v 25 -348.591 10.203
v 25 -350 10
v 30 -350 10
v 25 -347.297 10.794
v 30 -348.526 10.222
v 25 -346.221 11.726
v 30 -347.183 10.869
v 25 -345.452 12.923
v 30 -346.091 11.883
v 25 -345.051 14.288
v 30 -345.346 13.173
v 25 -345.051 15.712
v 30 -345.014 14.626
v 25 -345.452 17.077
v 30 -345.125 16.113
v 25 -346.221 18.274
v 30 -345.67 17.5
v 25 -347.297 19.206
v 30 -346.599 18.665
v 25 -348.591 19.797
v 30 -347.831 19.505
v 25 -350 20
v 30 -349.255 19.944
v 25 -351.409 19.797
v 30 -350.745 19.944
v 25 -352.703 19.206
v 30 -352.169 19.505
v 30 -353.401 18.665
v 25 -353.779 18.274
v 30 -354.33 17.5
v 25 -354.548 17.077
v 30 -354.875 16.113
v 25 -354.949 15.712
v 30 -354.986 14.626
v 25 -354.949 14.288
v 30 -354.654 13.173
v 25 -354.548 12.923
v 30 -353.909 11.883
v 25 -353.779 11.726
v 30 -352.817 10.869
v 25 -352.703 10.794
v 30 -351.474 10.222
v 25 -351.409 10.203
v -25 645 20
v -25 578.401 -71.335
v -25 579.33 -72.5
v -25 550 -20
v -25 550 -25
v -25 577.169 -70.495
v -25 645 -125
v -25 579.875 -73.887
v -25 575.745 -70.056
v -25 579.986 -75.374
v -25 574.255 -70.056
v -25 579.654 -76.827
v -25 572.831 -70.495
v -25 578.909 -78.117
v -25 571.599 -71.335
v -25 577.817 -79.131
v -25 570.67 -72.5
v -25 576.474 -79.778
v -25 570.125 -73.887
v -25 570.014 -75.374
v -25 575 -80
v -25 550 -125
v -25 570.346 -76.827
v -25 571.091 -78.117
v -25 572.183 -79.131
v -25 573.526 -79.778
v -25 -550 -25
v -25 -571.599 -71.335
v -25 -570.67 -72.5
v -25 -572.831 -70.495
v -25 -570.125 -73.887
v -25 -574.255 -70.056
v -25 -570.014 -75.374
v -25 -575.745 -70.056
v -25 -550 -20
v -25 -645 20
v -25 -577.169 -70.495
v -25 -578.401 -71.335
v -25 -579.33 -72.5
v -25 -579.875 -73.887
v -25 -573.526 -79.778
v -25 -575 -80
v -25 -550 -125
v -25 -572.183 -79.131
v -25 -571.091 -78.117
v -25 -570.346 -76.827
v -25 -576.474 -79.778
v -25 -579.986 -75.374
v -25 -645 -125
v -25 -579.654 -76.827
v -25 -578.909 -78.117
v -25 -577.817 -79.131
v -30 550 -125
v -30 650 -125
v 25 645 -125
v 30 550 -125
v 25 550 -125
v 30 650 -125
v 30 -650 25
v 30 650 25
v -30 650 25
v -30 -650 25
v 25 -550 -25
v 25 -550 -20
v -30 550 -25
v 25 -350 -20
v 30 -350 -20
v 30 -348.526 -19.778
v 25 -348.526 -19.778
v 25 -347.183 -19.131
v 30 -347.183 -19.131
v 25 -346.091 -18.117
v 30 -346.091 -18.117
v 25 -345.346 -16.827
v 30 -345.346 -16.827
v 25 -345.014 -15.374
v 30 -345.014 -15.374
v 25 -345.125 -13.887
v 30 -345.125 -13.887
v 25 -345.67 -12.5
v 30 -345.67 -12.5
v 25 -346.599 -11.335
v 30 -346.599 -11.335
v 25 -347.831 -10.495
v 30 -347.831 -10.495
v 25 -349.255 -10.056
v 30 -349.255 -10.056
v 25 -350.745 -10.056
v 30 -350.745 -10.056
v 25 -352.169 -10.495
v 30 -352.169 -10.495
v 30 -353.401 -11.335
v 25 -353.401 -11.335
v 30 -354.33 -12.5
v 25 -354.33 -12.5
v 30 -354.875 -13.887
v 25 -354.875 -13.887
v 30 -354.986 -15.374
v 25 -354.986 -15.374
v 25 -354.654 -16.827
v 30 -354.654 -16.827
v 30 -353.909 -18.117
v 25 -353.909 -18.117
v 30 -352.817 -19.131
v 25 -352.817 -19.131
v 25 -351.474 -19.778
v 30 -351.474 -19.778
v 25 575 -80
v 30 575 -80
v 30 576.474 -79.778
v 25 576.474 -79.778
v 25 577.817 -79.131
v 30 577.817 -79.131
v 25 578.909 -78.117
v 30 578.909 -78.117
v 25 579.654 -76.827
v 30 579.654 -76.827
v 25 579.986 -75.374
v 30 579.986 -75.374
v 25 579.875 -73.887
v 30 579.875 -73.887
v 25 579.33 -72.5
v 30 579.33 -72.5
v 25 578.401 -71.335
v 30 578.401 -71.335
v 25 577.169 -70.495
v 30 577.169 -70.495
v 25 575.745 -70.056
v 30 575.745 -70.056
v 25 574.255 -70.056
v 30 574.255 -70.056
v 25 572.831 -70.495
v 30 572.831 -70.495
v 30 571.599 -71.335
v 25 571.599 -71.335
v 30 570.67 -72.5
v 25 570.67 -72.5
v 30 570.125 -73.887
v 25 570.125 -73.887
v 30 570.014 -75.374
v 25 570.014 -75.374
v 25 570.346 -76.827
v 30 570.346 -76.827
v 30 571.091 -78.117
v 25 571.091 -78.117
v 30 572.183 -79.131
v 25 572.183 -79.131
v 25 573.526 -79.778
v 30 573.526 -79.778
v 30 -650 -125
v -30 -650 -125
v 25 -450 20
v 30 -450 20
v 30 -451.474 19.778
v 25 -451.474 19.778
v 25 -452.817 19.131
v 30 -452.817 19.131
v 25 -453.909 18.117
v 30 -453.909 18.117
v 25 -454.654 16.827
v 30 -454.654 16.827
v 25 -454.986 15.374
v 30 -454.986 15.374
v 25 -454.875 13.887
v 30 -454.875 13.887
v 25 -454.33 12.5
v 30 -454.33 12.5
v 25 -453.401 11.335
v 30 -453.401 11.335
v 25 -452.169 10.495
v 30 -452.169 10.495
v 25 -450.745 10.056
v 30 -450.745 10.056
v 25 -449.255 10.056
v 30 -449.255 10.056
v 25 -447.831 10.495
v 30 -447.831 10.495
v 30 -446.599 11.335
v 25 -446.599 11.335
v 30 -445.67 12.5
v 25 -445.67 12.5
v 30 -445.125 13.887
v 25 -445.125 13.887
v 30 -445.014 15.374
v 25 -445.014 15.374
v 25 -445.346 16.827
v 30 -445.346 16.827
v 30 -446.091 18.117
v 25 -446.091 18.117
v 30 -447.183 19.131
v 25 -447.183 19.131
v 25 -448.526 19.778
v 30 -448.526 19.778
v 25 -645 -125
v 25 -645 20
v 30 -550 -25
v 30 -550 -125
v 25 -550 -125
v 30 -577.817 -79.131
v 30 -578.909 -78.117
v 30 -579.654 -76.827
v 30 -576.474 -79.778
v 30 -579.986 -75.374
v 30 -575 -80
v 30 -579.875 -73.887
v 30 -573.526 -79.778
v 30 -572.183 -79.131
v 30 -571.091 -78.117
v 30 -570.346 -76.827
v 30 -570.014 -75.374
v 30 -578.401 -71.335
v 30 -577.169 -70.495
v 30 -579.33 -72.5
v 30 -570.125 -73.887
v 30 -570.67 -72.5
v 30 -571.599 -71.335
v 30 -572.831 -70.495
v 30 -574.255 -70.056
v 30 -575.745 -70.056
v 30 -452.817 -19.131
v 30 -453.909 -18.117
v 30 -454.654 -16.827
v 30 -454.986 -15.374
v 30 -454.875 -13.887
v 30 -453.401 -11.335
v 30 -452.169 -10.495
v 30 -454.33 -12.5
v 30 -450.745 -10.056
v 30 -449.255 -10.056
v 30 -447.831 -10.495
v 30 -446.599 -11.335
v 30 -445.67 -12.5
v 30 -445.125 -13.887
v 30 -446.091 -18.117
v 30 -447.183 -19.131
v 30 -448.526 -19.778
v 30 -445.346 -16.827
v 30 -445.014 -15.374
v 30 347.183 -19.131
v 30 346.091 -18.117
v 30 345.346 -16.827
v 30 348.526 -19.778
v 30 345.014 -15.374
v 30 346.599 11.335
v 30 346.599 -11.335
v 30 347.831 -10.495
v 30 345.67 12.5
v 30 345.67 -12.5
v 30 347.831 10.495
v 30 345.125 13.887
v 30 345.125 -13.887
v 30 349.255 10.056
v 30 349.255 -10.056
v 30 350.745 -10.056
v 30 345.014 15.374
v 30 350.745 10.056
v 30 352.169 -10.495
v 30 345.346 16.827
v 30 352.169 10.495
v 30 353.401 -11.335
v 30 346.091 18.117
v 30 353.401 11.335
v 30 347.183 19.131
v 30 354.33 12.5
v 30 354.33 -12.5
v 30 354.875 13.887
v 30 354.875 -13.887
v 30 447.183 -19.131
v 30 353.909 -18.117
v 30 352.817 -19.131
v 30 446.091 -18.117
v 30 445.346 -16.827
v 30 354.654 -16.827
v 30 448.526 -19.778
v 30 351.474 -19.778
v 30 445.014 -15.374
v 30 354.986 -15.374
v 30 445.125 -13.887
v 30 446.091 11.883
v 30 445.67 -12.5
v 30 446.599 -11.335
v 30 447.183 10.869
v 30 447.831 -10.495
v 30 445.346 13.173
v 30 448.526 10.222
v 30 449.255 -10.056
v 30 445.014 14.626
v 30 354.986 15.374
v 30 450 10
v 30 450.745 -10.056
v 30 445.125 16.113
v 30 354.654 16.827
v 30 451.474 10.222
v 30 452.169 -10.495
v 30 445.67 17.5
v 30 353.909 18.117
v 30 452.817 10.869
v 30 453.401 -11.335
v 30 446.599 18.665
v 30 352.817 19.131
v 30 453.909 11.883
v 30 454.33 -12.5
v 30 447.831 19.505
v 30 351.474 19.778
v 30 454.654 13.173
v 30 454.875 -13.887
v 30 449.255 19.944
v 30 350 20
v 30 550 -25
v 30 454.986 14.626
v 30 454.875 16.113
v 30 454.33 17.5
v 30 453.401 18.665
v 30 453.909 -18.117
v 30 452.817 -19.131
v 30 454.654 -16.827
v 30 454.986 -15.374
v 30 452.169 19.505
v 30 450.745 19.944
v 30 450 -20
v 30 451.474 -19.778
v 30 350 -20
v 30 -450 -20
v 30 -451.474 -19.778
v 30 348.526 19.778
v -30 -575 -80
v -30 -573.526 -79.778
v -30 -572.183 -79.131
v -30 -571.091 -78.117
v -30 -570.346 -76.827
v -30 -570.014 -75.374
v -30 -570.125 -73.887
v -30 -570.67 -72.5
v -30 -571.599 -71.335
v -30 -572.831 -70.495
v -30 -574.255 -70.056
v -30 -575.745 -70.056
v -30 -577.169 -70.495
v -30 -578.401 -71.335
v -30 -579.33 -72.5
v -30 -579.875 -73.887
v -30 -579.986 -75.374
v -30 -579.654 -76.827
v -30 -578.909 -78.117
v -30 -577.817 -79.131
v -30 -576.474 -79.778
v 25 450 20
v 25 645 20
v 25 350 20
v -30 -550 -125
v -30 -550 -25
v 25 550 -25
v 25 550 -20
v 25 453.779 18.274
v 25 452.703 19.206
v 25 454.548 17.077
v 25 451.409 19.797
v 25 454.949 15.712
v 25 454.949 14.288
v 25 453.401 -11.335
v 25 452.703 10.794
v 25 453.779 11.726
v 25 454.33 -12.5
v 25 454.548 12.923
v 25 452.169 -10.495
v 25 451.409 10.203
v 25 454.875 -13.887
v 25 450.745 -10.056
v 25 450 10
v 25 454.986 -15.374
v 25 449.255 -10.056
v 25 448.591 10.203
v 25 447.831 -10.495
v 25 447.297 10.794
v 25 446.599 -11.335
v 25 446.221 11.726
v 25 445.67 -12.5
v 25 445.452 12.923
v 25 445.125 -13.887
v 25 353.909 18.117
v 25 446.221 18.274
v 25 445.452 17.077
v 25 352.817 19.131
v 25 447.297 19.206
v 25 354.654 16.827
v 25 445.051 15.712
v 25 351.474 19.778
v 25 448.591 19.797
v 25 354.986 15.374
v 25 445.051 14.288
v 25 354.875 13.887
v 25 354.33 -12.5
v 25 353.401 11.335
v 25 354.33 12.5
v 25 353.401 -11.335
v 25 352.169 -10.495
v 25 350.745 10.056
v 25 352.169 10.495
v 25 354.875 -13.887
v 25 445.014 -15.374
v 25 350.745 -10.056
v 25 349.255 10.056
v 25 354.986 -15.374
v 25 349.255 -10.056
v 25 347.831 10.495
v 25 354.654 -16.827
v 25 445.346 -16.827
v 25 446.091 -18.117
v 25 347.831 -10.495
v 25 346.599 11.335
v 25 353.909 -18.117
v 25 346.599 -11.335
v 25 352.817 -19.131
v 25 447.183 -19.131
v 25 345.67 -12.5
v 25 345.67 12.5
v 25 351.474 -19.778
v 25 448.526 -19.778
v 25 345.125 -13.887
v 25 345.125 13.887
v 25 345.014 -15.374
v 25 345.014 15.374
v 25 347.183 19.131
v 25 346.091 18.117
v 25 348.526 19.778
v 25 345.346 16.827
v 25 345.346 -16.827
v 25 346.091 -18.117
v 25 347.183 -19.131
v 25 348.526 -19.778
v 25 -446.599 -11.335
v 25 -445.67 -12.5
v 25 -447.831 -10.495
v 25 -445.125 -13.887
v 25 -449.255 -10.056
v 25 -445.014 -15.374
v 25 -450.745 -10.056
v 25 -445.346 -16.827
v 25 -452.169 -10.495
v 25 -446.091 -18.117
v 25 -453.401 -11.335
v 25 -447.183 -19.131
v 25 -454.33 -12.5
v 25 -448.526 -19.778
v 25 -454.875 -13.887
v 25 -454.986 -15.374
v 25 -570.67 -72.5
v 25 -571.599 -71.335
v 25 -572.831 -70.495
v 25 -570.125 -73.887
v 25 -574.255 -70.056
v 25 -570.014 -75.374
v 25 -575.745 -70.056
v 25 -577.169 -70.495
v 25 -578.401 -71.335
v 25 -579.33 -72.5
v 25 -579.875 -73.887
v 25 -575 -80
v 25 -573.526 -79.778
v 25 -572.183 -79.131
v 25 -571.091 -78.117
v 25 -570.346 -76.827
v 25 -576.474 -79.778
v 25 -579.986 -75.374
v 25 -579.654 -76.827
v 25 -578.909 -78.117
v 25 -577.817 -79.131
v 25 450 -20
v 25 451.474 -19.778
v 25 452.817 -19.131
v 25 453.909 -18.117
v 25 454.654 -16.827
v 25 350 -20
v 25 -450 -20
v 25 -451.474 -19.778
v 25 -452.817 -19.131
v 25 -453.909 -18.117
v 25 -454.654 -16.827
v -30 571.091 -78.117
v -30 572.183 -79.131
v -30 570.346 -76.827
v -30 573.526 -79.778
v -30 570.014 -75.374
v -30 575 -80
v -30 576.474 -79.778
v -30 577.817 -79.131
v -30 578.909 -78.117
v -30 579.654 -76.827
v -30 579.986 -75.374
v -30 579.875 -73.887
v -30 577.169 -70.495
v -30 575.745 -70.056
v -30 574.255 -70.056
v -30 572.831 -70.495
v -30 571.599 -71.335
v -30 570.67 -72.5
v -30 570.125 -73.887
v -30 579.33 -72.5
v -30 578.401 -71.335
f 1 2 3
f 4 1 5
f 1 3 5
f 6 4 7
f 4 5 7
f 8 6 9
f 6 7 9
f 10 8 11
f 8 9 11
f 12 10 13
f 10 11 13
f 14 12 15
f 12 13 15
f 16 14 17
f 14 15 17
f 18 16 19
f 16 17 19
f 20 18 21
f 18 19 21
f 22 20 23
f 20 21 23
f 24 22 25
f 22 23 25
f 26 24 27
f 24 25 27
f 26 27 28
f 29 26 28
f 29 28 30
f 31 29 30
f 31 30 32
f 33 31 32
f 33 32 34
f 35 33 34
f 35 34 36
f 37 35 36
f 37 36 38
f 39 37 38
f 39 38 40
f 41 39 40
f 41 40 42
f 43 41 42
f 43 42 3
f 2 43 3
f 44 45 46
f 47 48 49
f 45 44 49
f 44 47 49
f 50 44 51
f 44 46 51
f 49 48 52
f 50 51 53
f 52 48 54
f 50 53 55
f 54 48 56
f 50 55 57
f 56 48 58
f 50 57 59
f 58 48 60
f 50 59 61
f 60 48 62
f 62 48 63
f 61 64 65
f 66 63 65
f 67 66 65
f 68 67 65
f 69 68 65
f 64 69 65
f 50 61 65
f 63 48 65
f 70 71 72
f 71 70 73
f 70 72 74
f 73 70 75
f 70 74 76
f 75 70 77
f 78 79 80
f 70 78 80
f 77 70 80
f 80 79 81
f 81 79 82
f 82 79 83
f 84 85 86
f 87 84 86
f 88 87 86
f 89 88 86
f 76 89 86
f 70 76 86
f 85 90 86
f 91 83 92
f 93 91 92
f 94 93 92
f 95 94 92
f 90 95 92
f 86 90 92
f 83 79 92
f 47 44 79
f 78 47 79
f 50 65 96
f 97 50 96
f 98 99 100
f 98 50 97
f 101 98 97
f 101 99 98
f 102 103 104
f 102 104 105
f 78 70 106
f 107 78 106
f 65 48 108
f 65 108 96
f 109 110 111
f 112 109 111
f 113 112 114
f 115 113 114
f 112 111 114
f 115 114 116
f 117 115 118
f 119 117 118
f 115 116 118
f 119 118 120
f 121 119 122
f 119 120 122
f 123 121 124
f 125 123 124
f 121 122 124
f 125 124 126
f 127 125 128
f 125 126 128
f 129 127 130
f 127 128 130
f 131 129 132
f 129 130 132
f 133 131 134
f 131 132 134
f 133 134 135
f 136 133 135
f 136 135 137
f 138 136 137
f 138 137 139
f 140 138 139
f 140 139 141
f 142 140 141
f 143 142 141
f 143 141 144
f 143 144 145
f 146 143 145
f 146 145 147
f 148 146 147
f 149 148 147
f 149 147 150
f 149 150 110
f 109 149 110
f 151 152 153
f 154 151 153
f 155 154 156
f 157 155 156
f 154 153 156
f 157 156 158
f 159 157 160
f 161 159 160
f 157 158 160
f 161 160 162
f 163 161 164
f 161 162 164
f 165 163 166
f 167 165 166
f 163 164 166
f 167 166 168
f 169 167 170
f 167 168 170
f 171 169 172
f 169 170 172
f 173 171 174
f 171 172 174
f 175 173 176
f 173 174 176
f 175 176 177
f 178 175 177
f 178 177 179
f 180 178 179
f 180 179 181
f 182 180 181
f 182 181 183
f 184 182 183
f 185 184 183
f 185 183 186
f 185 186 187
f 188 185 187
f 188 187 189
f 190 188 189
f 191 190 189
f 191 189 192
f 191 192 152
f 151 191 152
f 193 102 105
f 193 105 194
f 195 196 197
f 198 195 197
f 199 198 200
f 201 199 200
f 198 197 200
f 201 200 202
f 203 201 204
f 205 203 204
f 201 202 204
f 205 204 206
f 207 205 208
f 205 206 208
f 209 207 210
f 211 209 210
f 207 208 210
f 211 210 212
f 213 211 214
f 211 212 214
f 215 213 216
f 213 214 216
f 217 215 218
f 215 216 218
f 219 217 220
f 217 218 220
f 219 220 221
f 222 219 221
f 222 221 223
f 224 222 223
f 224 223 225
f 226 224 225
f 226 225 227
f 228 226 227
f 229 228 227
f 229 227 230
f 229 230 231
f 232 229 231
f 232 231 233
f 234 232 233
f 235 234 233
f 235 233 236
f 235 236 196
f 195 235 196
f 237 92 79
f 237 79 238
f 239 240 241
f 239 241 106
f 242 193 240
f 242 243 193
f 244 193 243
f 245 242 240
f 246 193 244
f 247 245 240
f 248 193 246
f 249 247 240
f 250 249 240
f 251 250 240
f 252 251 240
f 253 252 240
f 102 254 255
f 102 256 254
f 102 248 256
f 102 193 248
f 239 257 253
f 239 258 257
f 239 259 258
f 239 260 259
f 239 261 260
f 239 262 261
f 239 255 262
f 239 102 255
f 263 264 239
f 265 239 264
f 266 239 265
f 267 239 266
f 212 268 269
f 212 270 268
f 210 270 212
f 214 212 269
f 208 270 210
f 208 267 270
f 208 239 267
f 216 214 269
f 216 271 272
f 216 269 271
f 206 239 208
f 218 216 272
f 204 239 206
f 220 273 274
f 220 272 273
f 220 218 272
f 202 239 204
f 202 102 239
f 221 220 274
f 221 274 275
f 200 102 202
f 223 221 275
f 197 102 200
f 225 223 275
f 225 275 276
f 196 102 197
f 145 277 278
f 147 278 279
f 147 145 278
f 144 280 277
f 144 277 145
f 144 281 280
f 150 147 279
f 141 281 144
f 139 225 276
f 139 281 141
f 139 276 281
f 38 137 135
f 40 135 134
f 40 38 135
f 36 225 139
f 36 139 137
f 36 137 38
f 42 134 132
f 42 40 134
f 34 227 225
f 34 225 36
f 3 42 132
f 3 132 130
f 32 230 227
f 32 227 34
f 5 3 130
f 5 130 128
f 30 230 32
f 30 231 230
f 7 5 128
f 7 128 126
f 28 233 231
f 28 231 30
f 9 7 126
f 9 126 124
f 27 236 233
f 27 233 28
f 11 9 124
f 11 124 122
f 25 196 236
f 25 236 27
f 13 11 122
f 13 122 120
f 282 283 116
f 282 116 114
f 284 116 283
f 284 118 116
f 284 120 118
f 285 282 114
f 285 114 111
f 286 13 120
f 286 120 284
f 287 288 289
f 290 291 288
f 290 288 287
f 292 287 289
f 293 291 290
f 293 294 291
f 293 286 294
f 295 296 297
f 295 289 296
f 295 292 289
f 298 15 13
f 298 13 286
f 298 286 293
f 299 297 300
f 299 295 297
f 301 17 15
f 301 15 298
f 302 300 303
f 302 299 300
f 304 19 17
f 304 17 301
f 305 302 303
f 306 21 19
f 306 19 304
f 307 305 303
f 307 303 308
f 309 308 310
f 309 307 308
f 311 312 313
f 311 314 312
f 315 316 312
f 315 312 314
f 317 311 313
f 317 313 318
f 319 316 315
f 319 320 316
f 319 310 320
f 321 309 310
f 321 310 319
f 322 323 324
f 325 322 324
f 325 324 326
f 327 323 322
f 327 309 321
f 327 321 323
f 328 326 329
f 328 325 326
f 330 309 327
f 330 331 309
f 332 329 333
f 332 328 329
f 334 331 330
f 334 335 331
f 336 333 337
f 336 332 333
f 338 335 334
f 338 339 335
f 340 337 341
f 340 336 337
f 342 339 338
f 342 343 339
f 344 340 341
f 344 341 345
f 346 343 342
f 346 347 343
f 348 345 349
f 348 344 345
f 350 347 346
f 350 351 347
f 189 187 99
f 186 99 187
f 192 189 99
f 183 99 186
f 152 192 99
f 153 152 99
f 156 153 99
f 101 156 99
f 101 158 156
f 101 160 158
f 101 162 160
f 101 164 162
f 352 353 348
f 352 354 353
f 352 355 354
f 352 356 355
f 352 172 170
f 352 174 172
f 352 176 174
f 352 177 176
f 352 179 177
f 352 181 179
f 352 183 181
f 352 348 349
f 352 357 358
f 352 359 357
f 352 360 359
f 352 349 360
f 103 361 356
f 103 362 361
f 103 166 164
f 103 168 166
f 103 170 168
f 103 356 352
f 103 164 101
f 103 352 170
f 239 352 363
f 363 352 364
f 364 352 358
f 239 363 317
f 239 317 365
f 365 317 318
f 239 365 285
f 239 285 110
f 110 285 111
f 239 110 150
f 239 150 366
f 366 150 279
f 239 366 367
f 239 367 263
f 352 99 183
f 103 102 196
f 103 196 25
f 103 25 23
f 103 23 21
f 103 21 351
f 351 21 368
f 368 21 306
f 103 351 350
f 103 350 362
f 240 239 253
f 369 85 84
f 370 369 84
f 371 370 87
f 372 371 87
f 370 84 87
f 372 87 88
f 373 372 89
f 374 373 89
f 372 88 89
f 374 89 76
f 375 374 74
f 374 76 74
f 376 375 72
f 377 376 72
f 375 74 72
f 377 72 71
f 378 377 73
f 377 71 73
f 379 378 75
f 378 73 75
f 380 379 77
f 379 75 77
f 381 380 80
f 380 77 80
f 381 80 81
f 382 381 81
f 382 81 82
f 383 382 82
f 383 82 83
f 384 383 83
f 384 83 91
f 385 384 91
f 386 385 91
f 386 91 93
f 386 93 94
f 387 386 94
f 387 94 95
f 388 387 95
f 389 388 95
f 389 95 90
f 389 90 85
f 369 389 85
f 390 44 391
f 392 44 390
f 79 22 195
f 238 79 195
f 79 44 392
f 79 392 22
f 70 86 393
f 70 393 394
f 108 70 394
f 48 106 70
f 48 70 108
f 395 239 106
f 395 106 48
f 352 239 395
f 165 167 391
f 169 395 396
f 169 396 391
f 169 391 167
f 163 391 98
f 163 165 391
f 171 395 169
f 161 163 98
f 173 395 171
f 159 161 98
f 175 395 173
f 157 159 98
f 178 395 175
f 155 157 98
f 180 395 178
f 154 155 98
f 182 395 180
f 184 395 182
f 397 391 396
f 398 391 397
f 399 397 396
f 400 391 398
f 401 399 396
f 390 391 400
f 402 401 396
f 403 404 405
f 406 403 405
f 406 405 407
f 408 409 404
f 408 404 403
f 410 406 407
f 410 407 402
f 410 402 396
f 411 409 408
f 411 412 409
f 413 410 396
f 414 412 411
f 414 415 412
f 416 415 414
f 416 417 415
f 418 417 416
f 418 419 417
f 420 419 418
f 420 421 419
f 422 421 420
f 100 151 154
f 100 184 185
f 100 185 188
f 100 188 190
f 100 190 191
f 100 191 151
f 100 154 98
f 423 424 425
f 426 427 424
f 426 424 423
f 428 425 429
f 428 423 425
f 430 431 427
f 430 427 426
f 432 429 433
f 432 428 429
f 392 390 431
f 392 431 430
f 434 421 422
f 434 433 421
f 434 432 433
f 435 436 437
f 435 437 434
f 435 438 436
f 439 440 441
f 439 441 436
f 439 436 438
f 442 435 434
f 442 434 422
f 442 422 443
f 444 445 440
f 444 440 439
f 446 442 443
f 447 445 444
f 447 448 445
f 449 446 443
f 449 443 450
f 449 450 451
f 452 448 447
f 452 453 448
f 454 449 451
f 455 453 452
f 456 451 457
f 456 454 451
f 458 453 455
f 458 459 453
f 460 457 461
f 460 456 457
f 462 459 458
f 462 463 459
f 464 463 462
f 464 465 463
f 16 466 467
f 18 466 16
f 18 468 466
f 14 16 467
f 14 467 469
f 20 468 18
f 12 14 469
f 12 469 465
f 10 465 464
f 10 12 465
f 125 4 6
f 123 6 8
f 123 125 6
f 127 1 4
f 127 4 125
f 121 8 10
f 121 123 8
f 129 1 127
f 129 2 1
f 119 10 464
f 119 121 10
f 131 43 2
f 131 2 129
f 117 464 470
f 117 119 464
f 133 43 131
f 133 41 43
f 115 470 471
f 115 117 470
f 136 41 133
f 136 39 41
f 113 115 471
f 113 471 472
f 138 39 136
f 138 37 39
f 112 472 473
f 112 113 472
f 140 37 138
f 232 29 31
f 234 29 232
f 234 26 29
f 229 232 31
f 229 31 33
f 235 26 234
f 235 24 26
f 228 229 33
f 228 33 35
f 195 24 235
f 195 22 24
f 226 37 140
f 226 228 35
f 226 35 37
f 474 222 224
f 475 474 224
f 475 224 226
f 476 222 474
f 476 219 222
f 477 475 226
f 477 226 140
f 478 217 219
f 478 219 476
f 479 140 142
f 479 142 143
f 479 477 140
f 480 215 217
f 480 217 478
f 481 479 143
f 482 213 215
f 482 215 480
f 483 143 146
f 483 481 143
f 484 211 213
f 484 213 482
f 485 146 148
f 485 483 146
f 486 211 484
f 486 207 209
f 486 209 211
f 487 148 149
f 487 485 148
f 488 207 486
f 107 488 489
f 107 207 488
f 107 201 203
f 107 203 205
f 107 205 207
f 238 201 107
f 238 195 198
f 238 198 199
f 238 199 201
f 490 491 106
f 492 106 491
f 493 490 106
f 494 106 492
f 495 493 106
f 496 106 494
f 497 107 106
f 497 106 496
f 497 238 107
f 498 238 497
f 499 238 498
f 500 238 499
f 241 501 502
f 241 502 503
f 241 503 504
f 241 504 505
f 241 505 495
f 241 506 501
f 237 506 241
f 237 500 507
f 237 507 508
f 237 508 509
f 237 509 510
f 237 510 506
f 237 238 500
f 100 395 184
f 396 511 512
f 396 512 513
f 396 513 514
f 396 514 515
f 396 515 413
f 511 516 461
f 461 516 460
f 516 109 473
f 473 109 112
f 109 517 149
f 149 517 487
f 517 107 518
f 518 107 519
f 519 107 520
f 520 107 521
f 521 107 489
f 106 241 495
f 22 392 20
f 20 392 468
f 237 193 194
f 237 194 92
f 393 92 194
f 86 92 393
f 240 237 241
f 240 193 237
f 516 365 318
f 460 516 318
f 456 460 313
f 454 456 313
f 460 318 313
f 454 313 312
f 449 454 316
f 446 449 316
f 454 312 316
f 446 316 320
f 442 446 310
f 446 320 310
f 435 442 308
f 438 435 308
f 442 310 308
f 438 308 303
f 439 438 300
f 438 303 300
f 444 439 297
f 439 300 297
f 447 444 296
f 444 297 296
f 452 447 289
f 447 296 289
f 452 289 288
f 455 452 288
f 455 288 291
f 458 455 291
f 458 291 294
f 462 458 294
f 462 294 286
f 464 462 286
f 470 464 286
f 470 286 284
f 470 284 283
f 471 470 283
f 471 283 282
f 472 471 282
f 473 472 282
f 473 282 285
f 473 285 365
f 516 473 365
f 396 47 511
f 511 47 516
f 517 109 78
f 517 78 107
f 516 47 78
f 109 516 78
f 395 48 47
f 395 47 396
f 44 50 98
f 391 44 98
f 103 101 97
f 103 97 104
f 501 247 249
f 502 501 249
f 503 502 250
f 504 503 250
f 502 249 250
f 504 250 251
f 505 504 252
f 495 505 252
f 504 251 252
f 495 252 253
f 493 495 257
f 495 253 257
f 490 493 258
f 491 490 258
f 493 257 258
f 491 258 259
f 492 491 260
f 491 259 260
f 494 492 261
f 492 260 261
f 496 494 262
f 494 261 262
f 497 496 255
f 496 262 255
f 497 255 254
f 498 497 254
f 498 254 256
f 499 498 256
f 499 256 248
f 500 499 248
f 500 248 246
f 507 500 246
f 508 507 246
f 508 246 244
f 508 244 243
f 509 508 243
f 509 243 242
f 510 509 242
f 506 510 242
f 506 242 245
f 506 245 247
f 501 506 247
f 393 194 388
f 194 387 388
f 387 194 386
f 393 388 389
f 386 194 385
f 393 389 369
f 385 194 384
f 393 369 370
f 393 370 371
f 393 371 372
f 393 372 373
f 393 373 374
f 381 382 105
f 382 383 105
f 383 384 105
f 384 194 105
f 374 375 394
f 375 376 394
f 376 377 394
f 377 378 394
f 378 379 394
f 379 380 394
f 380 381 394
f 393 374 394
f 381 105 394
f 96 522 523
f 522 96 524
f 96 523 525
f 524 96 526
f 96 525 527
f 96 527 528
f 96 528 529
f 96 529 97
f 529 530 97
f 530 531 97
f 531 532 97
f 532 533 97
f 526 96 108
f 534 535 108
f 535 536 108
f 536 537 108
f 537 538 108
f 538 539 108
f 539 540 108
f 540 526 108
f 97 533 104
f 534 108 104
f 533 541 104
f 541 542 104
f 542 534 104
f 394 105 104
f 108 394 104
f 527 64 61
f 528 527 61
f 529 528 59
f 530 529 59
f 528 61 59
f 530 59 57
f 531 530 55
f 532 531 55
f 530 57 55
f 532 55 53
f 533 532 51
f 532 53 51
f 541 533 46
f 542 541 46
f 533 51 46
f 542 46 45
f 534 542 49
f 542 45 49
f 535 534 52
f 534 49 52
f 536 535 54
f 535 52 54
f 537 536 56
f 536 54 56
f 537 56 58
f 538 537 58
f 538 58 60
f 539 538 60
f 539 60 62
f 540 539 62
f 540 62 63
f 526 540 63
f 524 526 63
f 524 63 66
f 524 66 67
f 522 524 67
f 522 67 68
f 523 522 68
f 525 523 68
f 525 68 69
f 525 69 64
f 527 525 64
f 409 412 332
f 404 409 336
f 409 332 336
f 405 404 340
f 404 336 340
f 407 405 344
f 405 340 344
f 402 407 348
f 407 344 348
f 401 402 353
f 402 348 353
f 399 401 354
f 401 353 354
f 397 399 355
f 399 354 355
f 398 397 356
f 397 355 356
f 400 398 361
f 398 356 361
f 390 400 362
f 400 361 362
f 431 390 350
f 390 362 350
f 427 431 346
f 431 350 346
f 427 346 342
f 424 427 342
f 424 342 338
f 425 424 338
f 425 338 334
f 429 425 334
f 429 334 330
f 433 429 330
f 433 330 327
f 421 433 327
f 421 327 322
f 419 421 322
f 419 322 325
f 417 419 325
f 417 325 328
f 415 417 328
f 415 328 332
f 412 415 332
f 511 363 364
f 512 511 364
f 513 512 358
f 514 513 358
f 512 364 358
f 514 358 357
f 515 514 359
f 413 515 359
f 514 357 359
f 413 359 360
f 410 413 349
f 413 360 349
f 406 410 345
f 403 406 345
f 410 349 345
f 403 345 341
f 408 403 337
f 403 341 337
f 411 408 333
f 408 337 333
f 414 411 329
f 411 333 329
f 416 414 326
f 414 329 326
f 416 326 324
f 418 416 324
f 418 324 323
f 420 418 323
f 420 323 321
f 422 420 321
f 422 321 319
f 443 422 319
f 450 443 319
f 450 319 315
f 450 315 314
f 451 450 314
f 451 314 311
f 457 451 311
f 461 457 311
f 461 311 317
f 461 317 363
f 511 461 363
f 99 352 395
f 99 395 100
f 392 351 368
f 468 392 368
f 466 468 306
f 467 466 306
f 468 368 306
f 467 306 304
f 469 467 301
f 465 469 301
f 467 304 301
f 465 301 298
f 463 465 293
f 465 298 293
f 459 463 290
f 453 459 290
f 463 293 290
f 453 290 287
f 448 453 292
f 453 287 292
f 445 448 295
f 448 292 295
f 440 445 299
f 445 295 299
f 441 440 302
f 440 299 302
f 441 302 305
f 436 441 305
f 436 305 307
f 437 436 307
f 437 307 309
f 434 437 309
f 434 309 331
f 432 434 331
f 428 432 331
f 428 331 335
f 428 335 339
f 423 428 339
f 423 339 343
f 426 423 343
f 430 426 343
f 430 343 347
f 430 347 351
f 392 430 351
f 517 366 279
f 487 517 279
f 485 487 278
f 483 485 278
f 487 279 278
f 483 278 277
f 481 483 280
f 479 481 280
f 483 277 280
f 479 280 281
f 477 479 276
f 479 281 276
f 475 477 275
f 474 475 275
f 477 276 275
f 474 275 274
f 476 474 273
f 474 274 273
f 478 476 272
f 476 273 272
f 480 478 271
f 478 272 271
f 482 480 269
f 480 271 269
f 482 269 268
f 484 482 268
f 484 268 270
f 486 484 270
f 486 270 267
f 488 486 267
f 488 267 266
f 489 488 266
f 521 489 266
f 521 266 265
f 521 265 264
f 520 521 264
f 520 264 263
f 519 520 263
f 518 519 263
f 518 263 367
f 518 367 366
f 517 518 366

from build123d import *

# Parameters (mm, degrees)
BOSS_EXTRUDE1_DEPTH = 30
SHELL1_START        = -645
SHELL1_OUTLINE_W    = 50
SHELL1_OUTLINE_H    = 40
SHELL1_DEPTH        = 1290
SHELL1_2_OUTLINE_W  = 50
SHELL1_2_OUTLINE_H  = 105
SHELL1_2_DEPTH      = 95
SHELL1_START_2      = 550
SHELL1_3_OUTLINE_W  = 50
SHELL1_3_OUTLINE_H  = 105
SHELL1_3_DEPTH      = 95
SKETCH2_R           = 5
CUT_EXTRUDE1_DEPTH  = 665.623953827
CUT_EXTRUDE2_REACH  = 666.624
SKETCH3_R           = 5


# Read off the part's stored shape, not the designer's step: Shell1
with BuildPart() as part:
    # Sketch1 → Boss-Extrude1 (new, symmetric)
    with BuildSketch(Plane.YZ):
        Polygon((-550, -25), (550, -25), (550, -125), (650, -125), (650, 25), (550, 25), (-550, 25), (-650, 25), (-650, -125), (-550, -125), align=None)
    extrude(amount=BOSS_EXTRUDE1_DEPTH, both=True)

    # Shell1 outline → Shell1 (cut)
    with BuildSketch(Plane(origin=(0, 0, 0), x_dir=(1, 0, 0), z_dir=(0, 1, 0)).offset(SHELL1_START)):
        Rectangle(SHELL1_OUTLINE_W, SHELL1_OUTLINE_H)
    extrude(amount=SHELL1_DEPTH, mode=Mode.SUBTRACT)

    # Shell1 2 outline → Shell1 2 (cut)
    with BuildSketch(Plane(origin=(0, 0, 0), x_dir=(1, 0, 0), z_dir=(0, 1, 0)).offset(SHELL1_START)):
        with Locations((0, 72.5)):
            Rectangle(SHELL1_2_OUTLINE_W, SHELL1_2_OUTLINE_H)
    extrude(amount=SHELL1_2_DEPTH, mode=Mode.SUBTRACT)

    # Shell1 3 outline → Shell1 3 (cut)
    with BuildSketch(Plane(origin=(0, 0, 0), x_dir=(1, 0, 0), z_dir=(0, 1, 0)).offset(SHELL1_START_2)):
        with Locations((0, 72.5)):
            Rectangle(SHELL1_3_OUTLINE_W, SHELL1_3_OUTLINE_H)
    extrude(amount=SHELL1_3_DEPTH, mode=Mode.SUBTRACT)

    # Sketch2 → Cut-Extrude1 (cut, through all)
    with BuildSketch(Plane.YZ.offset(30)):
        with Locations(Location((-575, -75, 0), (0, 0, 270))):
            Circle(SKETCH2_R)
        with Locations(Location((575, -75, 0), (0, 0, 270))):
            Circle(SKETCH2_R)
    extrude(amount=-CUT_EXTRUDE1_DEPTH, mode=Mode.SUBTRACT)

    # Sketch3 → Cut-Extrude2 (cut, up to next)
    with BuildSketch(Plane.YZ.offset(30), mode=Mode.PRIVATE) as cut_extrude2_sk1:
        with Locations(Location((-350, 15, 0), (0, 0, 270))):
            Circle(SKETCH3_R)
    cut_extrude2_tool1 = extrude(cut_extrude2_sk1.sketch, amount=-CUT_EXTRUDE2_REACH, mode=Mode.PRIVATE) & part.part
    # Sketch3 → Cut-Extrude2 (cut, up to next)
    with BuildSketch(Plane.YZ.offset(30), mode=Mode.PRIVATE) as cut_extrude2_sk2:
        with Locations(Location((-350, -15, 0), (0, 0, 270))):
            Circle(SKETCH3_R)
    cut_extrude2_tool2 = extrude(cut_extrude2_sk2.sketch, amount=-CUT_EXTRUDE2_REACH, mode=Mode.PRIVATE) & part.part
    # Sketch3 → Cut-Extrude2 (cut, up to next)
    with BuildSketch(Plane.YZ.offset(30), mode=Mode.PRIVATE) as cut_extrude2_sk3:
        with Locations(Location((-450, 15, 0), (0, 0, 90))):
            Circle(SKETCH3_R)
    cut_extrude2_tool3 = extrude(cut_extrude2_sk3.sketch, amount=-CUT_EXTRUDE2_REACH, mode=Mode.PRIVATE) & part.part
    # Sketch3 → Cut-Extrude2 (cut, up to next)
    with BuildSketch(Plane.YZ.offset(30), mode=Mode.PRIVATE) as cut_extrude2_sk4:
        with Locations(Location((-450, -15, 0), (0, 0, 270))):
            Circle(SKETCH3_R)
    cut_extrude2_tool4 = extrude(cut_extrude2_sk4.sketch, amount=-CUT_EXTRUDE2_REACH, mode=Mode.PRIVATE) & part.part
    # Sketch3 → Cut-Extrude2 (cut, up to next)
    with BuildSketch(Plane.YZ.offset(30), mode=Mode.PRIVATE) as cut_extrude2_sk5:
        with Locations(Location((450, -15, 0), (0, 0, 270))):
            Circle(SKETCH3_R)
    cut_extrude2_tool5 = extrude(cut_extrude2_sk5.sketch, amount=-CUT_EXTRUDE2_REACH, mode=Mode.PRIVATE) & part.part
    # Sketch3 → Cut-Extrude2 (cut, up to next)
    with BuildSketch(Plane.YZ.offset(30), mode=Mode.PRIVATE) as cut_extrude2_sk6:
        with Locations(Location((450, 15, 0), (0, 0, 270))):
            Circle(SKETCH3_R)
    cut_extrude2_tool6 = extrude(cut_extrude2_sk6.sketch, amount=-CUT_EXTRUDE2_REACH, mode=Mode.PRIVATE) & part.part
    # Sketch3 → Cut-Extrude2 (cut, up to next)
    with BuildSketch(Plane.YZ.offset(30), mode=Mode.PRIVATE) as cut_extrude2_sk7:
        with Locations(Location((350, -15, 0), (0, 0, 270))):
            Circle(SKETCH3_R)
    cut_extrude2_tool7 = extrude(cut_extrude2_sk7.sketch, amount=-CUT_EXTRUDE2_REACH, mode=Mode.PRIVATE) & part.part
    # Sketch3 → Cut-Extrude2 (cut, up to next)
    with BuildSketch(Plane.YZ.offset(30), mode=Mode.PRIVATE) as cut_extrude2_sk8:
        with Locations(Location((350, 15, 0), (0, 0, 90))):
            Circle(SKETCH3_R)
    cut_extrude2_tool8 = extrude(cut_extrude2_sk8.sketch, amount=-CUT_EXTRUDE2_REACH, mode=Mode.PRIVATE) & part.part
    add(cut_extrude2_tool1.solids().sort_by_distance((30, -350, 15))[0], mode=Mode.SUBTRACT)
    add(cut_extrude2_tool2.solids().sort_by_distance((30, -350, -15))[0], mode=Mode.SUBTRACT)
    add(cut_extrude2_tool3.solids().sort_by_distance((30, -450, 15))[0], mode=Mode.SUBTRACT)
    add(cut_extrude2_tool4.solids().sort_by_distance((30, -450, -15))[0], mode=Mode.SUBTRACT)
    add(cut_extrude2_tool5.solids().sort_by_distance((30, 450, -15))[0], mode=Mode.SUBTRACT)
    add(cut_extrude2_tool6.solids().sort_by_distance((30, 450, 15))[0], mode=Mode.SUBTRACT)
    add(cut_extrude2_tool7.solids().sort_by_distance((30, 350, -15))[0], mode=Mode.SUBTRACT)
    add(cut_extrude2_tool8.solids().sort_by_distance((30, 350, 15))[0], mode=Mode.SUBTRACT)


solid = part.part
